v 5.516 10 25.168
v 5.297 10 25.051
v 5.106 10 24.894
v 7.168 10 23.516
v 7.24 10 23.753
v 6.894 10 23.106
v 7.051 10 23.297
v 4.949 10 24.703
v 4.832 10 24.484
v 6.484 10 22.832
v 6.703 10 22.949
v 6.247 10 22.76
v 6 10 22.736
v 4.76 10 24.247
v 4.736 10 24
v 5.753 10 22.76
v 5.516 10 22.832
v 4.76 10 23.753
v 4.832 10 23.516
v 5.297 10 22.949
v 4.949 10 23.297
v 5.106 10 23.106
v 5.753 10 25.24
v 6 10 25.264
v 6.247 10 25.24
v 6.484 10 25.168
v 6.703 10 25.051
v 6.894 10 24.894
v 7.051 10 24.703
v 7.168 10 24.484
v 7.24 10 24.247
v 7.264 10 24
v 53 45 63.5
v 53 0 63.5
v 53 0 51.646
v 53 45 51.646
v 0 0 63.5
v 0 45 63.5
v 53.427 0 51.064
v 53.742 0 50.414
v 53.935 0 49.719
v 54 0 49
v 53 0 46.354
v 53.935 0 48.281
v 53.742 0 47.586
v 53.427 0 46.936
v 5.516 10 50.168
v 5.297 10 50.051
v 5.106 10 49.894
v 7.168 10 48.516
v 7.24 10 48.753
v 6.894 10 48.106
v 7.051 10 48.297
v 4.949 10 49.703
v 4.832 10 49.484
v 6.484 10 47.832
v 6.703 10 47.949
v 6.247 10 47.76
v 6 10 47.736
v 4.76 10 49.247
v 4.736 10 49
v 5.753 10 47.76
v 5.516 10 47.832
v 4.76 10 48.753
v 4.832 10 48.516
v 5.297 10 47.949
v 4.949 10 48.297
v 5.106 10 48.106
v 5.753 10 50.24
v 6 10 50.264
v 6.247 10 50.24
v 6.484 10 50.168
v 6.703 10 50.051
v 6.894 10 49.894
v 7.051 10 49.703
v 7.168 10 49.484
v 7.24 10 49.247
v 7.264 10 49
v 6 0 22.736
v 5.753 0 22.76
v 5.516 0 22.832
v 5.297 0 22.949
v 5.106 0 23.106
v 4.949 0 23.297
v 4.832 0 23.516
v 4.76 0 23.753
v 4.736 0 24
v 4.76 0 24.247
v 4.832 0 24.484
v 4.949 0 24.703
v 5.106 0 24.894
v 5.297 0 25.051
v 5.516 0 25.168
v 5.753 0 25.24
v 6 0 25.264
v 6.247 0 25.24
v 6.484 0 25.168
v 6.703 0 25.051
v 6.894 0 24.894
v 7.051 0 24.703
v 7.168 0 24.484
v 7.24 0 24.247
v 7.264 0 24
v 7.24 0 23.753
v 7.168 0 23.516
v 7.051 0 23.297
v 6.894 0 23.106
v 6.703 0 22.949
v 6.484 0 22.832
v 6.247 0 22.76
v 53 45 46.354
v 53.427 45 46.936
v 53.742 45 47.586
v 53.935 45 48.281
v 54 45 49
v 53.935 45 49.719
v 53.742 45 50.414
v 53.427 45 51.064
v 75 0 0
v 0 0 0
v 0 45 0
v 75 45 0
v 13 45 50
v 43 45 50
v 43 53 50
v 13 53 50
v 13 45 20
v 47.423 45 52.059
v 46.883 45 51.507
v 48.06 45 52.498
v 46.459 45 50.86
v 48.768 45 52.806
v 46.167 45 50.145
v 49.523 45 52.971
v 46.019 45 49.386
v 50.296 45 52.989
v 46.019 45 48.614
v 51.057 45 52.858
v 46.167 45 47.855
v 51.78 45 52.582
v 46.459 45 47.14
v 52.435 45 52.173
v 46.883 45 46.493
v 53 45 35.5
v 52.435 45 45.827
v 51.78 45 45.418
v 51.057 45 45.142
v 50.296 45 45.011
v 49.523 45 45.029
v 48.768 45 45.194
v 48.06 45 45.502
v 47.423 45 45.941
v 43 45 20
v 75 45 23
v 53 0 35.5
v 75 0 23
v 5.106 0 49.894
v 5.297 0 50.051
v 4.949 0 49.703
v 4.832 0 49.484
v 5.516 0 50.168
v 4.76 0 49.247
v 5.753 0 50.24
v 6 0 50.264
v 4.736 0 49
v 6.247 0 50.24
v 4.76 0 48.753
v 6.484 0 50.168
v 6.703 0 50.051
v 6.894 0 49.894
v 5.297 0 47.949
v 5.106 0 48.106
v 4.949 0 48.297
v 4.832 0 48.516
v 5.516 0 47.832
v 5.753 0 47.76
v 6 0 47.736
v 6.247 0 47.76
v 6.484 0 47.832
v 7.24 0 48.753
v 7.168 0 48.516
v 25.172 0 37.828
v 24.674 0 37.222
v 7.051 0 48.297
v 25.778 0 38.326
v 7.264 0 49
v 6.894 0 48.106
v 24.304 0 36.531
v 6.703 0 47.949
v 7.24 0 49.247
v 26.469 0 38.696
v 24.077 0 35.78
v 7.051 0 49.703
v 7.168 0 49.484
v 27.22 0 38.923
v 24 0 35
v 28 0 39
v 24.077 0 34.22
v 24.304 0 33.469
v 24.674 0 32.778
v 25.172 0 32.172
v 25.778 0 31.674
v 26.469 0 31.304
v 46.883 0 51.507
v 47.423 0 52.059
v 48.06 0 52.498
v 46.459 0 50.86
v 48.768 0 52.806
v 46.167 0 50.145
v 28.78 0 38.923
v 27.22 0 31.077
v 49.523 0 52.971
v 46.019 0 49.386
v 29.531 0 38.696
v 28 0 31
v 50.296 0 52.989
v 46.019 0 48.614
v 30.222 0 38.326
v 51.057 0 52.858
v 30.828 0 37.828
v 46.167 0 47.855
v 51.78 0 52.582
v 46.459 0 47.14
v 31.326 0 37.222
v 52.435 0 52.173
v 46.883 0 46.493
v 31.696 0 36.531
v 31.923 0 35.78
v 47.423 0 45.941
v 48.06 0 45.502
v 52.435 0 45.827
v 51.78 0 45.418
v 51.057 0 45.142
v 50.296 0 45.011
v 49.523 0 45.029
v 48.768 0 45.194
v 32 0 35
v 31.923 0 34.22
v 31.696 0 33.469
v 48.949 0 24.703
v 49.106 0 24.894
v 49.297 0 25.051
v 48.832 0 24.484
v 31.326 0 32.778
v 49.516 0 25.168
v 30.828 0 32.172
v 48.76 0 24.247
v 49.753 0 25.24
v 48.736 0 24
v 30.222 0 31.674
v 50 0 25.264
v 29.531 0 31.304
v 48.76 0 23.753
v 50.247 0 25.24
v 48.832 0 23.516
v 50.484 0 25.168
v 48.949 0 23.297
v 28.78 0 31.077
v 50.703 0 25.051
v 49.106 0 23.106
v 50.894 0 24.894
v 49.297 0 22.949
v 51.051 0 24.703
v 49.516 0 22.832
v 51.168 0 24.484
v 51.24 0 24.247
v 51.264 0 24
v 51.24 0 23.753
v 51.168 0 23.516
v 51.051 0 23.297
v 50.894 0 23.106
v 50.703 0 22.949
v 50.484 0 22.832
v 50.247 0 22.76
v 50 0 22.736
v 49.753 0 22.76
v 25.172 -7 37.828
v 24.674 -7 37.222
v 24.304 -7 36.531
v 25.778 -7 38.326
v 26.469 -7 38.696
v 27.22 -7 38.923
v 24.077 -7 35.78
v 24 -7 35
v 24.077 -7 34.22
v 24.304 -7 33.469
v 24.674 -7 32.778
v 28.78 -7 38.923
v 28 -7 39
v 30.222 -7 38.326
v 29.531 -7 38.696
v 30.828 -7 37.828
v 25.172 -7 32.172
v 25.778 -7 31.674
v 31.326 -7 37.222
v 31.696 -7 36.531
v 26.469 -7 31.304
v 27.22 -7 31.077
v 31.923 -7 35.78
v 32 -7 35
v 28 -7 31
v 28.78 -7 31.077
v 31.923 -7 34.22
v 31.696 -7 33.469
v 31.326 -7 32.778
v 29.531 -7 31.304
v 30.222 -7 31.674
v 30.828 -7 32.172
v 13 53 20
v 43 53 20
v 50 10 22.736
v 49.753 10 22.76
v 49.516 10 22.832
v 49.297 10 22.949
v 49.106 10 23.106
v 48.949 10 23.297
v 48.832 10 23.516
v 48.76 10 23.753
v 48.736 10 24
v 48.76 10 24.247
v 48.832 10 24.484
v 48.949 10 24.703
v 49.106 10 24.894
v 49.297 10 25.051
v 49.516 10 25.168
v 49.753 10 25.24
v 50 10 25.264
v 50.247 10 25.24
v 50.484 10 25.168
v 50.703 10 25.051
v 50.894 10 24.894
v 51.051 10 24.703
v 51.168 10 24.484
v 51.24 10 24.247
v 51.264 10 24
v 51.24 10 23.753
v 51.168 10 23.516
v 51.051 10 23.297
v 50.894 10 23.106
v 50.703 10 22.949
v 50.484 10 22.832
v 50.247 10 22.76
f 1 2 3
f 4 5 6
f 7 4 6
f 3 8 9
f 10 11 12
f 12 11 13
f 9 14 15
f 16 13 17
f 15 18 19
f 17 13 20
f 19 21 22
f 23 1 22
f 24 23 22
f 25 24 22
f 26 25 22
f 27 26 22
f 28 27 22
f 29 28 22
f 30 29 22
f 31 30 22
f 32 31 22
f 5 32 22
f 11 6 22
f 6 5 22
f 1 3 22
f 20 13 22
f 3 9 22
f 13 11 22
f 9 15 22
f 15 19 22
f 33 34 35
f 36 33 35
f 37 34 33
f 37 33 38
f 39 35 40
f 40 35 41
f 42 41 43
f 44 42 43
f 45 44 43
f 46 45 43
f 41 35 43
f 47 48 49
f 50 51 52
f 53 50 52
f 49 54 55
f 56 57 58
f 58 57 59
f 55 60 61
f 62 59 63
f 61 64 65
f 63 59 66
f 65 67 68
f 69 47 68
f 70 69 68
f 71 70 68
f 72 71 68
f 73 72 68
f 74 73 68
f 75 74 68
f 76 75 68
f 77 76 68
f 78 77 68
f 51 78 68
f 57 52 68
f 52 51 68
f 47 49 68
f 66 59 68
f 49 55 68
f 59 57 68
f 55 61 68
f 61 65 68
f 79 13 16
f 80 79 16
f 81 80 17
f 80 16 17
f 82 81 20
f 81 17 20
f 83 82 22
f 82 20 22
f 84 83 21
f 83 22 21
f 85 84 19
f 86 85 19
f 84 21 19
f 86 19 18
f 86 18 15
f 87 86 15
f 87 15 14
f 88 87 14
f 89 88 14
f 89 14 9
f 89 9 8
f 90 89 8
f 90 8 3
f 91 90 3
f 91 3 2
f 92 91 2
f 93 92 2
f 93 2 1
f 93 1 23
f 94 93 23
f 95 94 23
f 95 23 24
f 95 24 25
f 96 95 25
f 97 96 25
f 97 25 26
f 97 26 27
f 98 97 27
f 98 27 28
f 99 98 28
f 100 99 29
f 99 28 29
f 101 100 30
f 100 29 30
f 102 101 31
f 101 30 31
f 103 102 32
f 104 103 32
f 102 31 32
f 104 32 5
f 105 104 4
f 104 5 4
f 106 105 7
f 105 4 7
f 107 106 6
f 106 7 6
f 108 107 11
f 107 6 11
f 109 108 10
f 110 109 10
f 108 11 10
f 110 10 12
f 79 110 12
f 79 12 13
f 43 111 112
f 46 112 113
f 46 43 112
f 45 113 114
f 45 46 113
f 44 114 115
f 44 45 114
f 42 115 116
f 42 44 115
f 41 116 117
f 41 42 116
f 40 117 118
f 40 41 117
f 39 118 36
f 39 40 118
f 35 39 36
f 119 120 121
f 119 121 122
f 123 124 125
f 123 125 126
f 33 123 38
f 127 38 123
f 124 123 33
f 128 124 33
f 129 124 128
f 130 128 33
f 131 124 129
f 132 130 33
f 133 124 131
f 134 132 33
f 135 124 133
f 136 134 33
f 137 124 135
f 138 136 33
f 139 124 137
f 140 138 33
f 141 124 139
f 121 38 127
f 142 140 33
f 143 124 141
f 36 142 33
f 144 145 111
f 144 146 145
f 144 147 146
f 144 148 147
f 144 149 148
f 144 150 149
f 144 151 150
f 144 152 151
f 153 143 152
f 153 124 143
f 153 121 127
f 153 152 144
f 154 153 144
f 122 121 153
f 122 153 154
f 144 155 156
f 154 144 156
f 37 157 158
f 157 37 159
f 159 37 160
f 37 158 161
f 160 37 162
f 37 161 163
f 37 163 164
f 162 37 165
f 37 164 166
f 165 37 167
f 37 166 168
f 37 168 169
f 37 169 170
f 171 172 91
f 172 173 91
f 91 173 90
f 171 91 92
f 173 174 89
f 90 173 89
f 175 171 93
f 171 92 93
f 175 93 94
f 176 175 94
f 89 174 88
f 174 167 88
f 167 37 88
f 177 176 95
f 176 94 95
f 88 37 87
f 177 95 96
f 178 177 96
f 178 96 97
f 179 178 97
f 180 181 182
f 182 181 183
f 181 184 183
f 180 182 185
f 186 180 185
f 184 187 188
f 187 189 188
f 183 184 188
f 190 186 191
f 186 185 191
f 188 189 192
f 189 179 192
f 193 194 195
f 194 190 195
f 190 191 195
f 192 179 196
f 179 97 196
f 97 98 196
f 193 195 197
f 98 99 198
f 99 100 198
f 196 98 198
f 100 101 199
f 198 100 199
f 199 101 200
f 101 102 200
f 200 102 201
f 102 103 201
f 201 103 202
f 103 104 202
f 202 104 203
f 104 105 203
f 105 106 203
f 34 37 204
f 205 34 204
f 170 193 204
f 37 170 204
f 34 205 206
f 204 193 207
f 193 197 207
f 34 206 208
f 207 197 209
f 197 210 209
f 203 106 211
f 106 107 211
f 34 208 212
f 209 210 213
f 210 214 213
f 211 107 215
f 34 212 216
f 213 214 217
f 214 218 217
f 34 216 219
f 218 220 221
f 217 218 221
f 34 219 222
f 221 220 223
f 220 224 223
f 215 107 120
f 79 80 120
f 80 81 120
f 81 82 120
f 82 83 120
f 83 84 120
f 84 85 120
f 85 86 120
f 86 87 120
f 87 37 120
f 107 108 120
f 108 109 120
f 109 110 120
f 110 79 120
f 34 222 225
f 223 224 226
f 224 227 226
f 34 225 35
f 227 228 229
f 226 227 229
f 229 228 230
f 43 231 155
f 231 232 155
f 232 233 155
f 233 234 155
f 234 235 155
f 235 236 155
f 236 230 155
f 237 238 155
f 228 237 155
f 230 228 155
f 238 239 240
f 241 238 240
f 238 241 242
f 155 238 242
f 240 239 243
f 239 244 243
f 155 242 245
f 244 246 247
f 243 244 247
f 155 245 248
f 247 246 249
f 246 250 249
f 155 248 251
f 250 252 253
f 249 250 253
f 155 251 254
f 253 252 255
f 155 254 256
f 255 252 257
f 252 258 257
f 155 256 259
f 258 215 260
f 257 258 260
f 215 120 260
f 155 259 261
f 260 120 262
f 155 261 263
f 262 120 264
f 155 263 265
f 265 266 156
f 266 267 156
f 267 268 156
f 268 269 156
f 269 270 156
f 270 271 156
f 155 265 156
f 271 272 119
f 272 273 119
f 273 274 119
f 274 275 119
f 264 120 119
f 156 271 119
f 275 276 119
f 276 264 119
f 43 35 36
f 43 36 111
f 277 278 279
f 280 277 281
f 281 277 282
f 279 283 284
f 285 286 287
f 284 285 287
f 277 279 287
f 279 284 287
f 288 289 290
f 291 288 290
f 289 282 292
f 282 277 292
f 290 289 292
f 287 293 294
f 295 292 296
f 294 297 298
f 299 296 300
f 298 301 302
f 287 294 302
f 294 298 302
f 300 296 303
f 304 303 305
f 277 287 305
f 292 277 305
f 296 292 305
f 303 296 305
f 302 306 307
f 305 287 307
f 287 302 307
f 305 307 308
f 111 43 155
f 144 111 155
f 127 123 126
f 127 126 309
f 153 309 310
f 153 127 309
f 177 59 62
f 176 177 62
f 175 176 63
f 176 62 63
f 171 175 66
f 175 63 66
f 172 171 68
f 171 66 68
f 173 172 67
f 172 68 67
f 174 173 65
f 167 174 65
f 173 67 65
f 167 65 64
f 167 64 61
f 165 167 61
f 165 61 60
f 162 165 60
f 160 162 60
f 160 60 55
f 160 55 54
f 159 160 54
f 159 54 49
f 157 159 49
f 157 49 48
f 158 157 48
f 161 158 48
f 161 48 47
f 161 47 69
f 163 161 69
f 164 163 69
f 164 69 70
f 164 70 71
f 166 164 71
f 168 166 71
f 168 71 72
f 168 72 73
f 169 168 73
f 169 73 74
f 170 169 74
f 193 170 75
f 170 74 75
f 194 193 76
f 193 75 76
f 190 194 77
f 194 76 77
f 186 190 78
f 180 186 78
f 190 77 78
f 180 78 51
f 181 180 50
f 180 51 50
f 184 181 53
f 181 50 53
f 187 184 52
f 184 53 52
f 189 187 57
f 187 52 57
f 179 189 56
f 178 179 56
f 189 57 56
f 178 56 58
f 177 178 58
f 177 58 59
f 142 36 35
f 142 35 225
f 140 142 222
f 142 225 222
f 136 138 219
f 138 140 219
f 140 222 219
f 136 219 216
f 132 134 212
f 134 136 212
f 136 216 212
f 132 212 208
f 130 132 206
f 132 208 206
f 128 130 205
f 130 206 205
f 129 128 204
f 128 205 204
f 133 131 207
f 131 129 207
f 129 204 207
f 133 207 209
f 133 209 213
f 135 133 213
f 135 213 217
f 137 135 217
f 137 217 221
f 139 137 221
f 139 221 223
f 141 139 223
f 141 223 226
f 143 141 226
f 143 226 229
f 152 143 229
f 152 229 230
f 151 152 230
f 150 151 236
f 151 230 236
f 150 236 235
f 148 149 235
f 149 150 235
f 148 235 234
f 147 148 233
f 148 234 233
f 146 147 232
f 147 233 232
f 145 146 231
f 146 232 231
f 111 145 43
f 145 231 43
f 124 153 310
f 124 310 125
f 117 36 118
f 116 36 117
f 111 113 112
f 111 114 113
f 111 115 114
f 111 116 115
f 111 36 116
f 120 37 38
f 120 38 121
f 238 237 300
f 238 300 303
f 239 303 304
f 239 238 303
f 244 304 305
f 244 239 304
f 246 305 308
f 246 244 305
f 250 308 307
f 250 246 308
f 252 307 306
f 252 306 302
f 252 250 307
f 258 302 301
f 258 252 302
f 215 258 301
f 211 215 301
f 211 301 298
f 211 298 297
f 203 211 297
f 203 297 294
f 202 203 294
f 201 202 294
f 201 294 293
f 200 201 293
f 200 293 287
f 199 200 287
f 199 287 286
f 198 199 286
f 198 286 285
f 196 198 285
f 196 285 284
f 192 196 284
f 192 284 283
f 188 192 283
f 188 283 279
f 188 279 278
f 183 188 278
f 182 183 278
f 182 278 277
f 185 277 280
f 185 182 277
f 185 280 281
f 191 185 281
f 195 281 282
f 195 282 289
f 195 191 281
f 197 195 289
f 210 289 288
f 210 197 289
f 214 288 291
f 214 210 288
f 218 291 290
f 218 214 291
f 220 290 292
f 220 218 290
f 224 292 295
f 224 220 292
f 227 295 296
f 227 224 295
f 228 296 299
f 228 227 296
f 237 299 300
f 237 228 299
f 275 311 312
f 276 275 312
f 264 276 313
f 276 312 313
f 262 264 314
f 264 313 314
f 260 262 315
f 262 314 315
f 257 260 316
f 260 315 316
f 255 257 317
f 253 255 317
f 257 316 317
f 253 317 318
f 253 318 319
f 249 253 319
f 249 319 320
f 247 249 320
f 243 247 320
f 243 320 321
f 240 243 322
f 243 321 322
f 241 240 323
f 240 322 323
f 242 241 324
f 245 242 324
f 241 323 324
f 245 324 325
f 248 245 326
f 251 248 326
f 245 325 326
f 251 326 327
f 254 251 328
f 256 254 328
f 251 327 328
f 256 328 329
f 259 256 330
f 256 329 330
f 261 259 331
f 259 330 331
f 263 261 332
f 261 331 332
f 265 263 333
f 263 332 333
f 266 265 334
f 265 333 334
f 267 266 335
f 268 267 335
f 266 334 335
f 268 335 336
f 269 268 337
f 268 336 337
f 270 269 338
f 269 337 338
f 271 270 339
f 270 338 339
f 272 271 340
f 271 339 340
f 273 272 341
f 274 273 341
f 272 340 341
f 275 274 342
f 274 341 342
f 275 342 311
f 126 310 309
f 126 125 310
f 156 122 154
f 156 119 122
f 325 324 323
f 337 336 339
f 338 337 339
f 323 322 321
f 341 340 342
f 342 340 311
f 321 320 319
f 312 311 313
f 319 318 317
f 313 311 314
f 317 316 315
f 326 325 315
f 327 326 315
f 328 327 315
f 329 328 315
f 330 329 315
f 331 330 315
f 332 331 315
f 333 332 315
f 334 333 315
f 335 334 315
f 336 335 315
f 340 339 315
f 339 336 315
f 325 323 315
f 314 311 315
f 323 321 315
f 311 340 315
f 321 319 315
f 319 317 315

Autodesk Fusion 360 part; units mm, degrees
sketch "Sketch1" plane through (0, 0, 0) normal (0, 1, 0) x (1, 0, 0)
  line L0 (0, 0) -> (75, 0)
  line L1 (75, 0) -> (75, -63.5)
  line L2 (75, -63.5) -> (0, -63.5)
  line L3 (0, -63.5) -> (0, 0)
  line L4 (53, -63.5) -> (53, -35.5)
  line L5 (53, -35.5) -> (75, -23)
  line L6 (6, -49) -> (50, -49) construction
  line L7 (50, -49) -> (50, -24) construction
  line L8 (50, -24) -> (6, -24) construction
  line L9 (6, -24) -> (6, -49) construction
  circle A0 centre (28, -35) radius 4
  circle A1 centre (6, -49) radius 4
  circle A2 centre (6, -24) radius 4
  circle A3 centre (50, -24) radius 4
  circle A4 centre (50, -49) radius 4
  dimension "d1" = 63.5
  dimension "d2" = 75
  dimension "d3" = 53
  dimension "d4" = 23
  dimension "d5" = 28
  dimension "d6" = 44
  dimension "d7" = 25
  dimension "d8" = 28
  dimension "d9" = 35
  dimension "d10" = 14
  dimension "d11" = 22
  dimension "d12" = 8
  dimension "d13" = 8
extrude "Extrude1" add sketch "Sketch1" along normal blind 45 contours L0 L1 L2 L3 L4 L5 A4 | L4 A4 | A0 | A1 | A2 | A3 picked at (53.5526, -48.8079)
extrude "Extrude2" add sketch "Sketch1" against normal blind 7 contours A0
hole "Hole1" at (6, 0, 49) at (50, 0, 49) at (50, 0, 24) at (6, 0, 24) direction (0, 1, 0) diameter 2.529 depth 10 tip angle 180
sketch "Sketch2" plane through (0, 45, 0) normal (0, 1, 0) x (-1, 0, 0)
  line L0 (-53, 63.5) -> (-53, 35.5)
  line L1 (-53, 35.5) -> (-75, 23)
  line L2 (-75, 23) -> (-75, 0)
  line L3 (-75, 0) -> (0, 0)
  line L4 (0, 0) -> (0, 63.5)
  line L5 (0, 63.5) -> (-53, 63.5)
  line L6 (-43, 50) -> (-13, 50)
  line L7 (-13, 50) -> (-13, 20)
  line L8 (-13, 20) -> (-43, 20)
  line L9 (-43, 20) -> (-43, 50)
  line L10 (-43, 50) -> (-13, 20) construction
  line L11 (-13, 50) -> (-43, 20) construction
  point P0 (-28, 35)
  dimension "d21" = 30
  dimension "d22" = 28
  dimension "d23" = 35
extrude "Extrude3" add sketch "Sketch2" along normal blind 8 contours L6 L7 L8 L9
